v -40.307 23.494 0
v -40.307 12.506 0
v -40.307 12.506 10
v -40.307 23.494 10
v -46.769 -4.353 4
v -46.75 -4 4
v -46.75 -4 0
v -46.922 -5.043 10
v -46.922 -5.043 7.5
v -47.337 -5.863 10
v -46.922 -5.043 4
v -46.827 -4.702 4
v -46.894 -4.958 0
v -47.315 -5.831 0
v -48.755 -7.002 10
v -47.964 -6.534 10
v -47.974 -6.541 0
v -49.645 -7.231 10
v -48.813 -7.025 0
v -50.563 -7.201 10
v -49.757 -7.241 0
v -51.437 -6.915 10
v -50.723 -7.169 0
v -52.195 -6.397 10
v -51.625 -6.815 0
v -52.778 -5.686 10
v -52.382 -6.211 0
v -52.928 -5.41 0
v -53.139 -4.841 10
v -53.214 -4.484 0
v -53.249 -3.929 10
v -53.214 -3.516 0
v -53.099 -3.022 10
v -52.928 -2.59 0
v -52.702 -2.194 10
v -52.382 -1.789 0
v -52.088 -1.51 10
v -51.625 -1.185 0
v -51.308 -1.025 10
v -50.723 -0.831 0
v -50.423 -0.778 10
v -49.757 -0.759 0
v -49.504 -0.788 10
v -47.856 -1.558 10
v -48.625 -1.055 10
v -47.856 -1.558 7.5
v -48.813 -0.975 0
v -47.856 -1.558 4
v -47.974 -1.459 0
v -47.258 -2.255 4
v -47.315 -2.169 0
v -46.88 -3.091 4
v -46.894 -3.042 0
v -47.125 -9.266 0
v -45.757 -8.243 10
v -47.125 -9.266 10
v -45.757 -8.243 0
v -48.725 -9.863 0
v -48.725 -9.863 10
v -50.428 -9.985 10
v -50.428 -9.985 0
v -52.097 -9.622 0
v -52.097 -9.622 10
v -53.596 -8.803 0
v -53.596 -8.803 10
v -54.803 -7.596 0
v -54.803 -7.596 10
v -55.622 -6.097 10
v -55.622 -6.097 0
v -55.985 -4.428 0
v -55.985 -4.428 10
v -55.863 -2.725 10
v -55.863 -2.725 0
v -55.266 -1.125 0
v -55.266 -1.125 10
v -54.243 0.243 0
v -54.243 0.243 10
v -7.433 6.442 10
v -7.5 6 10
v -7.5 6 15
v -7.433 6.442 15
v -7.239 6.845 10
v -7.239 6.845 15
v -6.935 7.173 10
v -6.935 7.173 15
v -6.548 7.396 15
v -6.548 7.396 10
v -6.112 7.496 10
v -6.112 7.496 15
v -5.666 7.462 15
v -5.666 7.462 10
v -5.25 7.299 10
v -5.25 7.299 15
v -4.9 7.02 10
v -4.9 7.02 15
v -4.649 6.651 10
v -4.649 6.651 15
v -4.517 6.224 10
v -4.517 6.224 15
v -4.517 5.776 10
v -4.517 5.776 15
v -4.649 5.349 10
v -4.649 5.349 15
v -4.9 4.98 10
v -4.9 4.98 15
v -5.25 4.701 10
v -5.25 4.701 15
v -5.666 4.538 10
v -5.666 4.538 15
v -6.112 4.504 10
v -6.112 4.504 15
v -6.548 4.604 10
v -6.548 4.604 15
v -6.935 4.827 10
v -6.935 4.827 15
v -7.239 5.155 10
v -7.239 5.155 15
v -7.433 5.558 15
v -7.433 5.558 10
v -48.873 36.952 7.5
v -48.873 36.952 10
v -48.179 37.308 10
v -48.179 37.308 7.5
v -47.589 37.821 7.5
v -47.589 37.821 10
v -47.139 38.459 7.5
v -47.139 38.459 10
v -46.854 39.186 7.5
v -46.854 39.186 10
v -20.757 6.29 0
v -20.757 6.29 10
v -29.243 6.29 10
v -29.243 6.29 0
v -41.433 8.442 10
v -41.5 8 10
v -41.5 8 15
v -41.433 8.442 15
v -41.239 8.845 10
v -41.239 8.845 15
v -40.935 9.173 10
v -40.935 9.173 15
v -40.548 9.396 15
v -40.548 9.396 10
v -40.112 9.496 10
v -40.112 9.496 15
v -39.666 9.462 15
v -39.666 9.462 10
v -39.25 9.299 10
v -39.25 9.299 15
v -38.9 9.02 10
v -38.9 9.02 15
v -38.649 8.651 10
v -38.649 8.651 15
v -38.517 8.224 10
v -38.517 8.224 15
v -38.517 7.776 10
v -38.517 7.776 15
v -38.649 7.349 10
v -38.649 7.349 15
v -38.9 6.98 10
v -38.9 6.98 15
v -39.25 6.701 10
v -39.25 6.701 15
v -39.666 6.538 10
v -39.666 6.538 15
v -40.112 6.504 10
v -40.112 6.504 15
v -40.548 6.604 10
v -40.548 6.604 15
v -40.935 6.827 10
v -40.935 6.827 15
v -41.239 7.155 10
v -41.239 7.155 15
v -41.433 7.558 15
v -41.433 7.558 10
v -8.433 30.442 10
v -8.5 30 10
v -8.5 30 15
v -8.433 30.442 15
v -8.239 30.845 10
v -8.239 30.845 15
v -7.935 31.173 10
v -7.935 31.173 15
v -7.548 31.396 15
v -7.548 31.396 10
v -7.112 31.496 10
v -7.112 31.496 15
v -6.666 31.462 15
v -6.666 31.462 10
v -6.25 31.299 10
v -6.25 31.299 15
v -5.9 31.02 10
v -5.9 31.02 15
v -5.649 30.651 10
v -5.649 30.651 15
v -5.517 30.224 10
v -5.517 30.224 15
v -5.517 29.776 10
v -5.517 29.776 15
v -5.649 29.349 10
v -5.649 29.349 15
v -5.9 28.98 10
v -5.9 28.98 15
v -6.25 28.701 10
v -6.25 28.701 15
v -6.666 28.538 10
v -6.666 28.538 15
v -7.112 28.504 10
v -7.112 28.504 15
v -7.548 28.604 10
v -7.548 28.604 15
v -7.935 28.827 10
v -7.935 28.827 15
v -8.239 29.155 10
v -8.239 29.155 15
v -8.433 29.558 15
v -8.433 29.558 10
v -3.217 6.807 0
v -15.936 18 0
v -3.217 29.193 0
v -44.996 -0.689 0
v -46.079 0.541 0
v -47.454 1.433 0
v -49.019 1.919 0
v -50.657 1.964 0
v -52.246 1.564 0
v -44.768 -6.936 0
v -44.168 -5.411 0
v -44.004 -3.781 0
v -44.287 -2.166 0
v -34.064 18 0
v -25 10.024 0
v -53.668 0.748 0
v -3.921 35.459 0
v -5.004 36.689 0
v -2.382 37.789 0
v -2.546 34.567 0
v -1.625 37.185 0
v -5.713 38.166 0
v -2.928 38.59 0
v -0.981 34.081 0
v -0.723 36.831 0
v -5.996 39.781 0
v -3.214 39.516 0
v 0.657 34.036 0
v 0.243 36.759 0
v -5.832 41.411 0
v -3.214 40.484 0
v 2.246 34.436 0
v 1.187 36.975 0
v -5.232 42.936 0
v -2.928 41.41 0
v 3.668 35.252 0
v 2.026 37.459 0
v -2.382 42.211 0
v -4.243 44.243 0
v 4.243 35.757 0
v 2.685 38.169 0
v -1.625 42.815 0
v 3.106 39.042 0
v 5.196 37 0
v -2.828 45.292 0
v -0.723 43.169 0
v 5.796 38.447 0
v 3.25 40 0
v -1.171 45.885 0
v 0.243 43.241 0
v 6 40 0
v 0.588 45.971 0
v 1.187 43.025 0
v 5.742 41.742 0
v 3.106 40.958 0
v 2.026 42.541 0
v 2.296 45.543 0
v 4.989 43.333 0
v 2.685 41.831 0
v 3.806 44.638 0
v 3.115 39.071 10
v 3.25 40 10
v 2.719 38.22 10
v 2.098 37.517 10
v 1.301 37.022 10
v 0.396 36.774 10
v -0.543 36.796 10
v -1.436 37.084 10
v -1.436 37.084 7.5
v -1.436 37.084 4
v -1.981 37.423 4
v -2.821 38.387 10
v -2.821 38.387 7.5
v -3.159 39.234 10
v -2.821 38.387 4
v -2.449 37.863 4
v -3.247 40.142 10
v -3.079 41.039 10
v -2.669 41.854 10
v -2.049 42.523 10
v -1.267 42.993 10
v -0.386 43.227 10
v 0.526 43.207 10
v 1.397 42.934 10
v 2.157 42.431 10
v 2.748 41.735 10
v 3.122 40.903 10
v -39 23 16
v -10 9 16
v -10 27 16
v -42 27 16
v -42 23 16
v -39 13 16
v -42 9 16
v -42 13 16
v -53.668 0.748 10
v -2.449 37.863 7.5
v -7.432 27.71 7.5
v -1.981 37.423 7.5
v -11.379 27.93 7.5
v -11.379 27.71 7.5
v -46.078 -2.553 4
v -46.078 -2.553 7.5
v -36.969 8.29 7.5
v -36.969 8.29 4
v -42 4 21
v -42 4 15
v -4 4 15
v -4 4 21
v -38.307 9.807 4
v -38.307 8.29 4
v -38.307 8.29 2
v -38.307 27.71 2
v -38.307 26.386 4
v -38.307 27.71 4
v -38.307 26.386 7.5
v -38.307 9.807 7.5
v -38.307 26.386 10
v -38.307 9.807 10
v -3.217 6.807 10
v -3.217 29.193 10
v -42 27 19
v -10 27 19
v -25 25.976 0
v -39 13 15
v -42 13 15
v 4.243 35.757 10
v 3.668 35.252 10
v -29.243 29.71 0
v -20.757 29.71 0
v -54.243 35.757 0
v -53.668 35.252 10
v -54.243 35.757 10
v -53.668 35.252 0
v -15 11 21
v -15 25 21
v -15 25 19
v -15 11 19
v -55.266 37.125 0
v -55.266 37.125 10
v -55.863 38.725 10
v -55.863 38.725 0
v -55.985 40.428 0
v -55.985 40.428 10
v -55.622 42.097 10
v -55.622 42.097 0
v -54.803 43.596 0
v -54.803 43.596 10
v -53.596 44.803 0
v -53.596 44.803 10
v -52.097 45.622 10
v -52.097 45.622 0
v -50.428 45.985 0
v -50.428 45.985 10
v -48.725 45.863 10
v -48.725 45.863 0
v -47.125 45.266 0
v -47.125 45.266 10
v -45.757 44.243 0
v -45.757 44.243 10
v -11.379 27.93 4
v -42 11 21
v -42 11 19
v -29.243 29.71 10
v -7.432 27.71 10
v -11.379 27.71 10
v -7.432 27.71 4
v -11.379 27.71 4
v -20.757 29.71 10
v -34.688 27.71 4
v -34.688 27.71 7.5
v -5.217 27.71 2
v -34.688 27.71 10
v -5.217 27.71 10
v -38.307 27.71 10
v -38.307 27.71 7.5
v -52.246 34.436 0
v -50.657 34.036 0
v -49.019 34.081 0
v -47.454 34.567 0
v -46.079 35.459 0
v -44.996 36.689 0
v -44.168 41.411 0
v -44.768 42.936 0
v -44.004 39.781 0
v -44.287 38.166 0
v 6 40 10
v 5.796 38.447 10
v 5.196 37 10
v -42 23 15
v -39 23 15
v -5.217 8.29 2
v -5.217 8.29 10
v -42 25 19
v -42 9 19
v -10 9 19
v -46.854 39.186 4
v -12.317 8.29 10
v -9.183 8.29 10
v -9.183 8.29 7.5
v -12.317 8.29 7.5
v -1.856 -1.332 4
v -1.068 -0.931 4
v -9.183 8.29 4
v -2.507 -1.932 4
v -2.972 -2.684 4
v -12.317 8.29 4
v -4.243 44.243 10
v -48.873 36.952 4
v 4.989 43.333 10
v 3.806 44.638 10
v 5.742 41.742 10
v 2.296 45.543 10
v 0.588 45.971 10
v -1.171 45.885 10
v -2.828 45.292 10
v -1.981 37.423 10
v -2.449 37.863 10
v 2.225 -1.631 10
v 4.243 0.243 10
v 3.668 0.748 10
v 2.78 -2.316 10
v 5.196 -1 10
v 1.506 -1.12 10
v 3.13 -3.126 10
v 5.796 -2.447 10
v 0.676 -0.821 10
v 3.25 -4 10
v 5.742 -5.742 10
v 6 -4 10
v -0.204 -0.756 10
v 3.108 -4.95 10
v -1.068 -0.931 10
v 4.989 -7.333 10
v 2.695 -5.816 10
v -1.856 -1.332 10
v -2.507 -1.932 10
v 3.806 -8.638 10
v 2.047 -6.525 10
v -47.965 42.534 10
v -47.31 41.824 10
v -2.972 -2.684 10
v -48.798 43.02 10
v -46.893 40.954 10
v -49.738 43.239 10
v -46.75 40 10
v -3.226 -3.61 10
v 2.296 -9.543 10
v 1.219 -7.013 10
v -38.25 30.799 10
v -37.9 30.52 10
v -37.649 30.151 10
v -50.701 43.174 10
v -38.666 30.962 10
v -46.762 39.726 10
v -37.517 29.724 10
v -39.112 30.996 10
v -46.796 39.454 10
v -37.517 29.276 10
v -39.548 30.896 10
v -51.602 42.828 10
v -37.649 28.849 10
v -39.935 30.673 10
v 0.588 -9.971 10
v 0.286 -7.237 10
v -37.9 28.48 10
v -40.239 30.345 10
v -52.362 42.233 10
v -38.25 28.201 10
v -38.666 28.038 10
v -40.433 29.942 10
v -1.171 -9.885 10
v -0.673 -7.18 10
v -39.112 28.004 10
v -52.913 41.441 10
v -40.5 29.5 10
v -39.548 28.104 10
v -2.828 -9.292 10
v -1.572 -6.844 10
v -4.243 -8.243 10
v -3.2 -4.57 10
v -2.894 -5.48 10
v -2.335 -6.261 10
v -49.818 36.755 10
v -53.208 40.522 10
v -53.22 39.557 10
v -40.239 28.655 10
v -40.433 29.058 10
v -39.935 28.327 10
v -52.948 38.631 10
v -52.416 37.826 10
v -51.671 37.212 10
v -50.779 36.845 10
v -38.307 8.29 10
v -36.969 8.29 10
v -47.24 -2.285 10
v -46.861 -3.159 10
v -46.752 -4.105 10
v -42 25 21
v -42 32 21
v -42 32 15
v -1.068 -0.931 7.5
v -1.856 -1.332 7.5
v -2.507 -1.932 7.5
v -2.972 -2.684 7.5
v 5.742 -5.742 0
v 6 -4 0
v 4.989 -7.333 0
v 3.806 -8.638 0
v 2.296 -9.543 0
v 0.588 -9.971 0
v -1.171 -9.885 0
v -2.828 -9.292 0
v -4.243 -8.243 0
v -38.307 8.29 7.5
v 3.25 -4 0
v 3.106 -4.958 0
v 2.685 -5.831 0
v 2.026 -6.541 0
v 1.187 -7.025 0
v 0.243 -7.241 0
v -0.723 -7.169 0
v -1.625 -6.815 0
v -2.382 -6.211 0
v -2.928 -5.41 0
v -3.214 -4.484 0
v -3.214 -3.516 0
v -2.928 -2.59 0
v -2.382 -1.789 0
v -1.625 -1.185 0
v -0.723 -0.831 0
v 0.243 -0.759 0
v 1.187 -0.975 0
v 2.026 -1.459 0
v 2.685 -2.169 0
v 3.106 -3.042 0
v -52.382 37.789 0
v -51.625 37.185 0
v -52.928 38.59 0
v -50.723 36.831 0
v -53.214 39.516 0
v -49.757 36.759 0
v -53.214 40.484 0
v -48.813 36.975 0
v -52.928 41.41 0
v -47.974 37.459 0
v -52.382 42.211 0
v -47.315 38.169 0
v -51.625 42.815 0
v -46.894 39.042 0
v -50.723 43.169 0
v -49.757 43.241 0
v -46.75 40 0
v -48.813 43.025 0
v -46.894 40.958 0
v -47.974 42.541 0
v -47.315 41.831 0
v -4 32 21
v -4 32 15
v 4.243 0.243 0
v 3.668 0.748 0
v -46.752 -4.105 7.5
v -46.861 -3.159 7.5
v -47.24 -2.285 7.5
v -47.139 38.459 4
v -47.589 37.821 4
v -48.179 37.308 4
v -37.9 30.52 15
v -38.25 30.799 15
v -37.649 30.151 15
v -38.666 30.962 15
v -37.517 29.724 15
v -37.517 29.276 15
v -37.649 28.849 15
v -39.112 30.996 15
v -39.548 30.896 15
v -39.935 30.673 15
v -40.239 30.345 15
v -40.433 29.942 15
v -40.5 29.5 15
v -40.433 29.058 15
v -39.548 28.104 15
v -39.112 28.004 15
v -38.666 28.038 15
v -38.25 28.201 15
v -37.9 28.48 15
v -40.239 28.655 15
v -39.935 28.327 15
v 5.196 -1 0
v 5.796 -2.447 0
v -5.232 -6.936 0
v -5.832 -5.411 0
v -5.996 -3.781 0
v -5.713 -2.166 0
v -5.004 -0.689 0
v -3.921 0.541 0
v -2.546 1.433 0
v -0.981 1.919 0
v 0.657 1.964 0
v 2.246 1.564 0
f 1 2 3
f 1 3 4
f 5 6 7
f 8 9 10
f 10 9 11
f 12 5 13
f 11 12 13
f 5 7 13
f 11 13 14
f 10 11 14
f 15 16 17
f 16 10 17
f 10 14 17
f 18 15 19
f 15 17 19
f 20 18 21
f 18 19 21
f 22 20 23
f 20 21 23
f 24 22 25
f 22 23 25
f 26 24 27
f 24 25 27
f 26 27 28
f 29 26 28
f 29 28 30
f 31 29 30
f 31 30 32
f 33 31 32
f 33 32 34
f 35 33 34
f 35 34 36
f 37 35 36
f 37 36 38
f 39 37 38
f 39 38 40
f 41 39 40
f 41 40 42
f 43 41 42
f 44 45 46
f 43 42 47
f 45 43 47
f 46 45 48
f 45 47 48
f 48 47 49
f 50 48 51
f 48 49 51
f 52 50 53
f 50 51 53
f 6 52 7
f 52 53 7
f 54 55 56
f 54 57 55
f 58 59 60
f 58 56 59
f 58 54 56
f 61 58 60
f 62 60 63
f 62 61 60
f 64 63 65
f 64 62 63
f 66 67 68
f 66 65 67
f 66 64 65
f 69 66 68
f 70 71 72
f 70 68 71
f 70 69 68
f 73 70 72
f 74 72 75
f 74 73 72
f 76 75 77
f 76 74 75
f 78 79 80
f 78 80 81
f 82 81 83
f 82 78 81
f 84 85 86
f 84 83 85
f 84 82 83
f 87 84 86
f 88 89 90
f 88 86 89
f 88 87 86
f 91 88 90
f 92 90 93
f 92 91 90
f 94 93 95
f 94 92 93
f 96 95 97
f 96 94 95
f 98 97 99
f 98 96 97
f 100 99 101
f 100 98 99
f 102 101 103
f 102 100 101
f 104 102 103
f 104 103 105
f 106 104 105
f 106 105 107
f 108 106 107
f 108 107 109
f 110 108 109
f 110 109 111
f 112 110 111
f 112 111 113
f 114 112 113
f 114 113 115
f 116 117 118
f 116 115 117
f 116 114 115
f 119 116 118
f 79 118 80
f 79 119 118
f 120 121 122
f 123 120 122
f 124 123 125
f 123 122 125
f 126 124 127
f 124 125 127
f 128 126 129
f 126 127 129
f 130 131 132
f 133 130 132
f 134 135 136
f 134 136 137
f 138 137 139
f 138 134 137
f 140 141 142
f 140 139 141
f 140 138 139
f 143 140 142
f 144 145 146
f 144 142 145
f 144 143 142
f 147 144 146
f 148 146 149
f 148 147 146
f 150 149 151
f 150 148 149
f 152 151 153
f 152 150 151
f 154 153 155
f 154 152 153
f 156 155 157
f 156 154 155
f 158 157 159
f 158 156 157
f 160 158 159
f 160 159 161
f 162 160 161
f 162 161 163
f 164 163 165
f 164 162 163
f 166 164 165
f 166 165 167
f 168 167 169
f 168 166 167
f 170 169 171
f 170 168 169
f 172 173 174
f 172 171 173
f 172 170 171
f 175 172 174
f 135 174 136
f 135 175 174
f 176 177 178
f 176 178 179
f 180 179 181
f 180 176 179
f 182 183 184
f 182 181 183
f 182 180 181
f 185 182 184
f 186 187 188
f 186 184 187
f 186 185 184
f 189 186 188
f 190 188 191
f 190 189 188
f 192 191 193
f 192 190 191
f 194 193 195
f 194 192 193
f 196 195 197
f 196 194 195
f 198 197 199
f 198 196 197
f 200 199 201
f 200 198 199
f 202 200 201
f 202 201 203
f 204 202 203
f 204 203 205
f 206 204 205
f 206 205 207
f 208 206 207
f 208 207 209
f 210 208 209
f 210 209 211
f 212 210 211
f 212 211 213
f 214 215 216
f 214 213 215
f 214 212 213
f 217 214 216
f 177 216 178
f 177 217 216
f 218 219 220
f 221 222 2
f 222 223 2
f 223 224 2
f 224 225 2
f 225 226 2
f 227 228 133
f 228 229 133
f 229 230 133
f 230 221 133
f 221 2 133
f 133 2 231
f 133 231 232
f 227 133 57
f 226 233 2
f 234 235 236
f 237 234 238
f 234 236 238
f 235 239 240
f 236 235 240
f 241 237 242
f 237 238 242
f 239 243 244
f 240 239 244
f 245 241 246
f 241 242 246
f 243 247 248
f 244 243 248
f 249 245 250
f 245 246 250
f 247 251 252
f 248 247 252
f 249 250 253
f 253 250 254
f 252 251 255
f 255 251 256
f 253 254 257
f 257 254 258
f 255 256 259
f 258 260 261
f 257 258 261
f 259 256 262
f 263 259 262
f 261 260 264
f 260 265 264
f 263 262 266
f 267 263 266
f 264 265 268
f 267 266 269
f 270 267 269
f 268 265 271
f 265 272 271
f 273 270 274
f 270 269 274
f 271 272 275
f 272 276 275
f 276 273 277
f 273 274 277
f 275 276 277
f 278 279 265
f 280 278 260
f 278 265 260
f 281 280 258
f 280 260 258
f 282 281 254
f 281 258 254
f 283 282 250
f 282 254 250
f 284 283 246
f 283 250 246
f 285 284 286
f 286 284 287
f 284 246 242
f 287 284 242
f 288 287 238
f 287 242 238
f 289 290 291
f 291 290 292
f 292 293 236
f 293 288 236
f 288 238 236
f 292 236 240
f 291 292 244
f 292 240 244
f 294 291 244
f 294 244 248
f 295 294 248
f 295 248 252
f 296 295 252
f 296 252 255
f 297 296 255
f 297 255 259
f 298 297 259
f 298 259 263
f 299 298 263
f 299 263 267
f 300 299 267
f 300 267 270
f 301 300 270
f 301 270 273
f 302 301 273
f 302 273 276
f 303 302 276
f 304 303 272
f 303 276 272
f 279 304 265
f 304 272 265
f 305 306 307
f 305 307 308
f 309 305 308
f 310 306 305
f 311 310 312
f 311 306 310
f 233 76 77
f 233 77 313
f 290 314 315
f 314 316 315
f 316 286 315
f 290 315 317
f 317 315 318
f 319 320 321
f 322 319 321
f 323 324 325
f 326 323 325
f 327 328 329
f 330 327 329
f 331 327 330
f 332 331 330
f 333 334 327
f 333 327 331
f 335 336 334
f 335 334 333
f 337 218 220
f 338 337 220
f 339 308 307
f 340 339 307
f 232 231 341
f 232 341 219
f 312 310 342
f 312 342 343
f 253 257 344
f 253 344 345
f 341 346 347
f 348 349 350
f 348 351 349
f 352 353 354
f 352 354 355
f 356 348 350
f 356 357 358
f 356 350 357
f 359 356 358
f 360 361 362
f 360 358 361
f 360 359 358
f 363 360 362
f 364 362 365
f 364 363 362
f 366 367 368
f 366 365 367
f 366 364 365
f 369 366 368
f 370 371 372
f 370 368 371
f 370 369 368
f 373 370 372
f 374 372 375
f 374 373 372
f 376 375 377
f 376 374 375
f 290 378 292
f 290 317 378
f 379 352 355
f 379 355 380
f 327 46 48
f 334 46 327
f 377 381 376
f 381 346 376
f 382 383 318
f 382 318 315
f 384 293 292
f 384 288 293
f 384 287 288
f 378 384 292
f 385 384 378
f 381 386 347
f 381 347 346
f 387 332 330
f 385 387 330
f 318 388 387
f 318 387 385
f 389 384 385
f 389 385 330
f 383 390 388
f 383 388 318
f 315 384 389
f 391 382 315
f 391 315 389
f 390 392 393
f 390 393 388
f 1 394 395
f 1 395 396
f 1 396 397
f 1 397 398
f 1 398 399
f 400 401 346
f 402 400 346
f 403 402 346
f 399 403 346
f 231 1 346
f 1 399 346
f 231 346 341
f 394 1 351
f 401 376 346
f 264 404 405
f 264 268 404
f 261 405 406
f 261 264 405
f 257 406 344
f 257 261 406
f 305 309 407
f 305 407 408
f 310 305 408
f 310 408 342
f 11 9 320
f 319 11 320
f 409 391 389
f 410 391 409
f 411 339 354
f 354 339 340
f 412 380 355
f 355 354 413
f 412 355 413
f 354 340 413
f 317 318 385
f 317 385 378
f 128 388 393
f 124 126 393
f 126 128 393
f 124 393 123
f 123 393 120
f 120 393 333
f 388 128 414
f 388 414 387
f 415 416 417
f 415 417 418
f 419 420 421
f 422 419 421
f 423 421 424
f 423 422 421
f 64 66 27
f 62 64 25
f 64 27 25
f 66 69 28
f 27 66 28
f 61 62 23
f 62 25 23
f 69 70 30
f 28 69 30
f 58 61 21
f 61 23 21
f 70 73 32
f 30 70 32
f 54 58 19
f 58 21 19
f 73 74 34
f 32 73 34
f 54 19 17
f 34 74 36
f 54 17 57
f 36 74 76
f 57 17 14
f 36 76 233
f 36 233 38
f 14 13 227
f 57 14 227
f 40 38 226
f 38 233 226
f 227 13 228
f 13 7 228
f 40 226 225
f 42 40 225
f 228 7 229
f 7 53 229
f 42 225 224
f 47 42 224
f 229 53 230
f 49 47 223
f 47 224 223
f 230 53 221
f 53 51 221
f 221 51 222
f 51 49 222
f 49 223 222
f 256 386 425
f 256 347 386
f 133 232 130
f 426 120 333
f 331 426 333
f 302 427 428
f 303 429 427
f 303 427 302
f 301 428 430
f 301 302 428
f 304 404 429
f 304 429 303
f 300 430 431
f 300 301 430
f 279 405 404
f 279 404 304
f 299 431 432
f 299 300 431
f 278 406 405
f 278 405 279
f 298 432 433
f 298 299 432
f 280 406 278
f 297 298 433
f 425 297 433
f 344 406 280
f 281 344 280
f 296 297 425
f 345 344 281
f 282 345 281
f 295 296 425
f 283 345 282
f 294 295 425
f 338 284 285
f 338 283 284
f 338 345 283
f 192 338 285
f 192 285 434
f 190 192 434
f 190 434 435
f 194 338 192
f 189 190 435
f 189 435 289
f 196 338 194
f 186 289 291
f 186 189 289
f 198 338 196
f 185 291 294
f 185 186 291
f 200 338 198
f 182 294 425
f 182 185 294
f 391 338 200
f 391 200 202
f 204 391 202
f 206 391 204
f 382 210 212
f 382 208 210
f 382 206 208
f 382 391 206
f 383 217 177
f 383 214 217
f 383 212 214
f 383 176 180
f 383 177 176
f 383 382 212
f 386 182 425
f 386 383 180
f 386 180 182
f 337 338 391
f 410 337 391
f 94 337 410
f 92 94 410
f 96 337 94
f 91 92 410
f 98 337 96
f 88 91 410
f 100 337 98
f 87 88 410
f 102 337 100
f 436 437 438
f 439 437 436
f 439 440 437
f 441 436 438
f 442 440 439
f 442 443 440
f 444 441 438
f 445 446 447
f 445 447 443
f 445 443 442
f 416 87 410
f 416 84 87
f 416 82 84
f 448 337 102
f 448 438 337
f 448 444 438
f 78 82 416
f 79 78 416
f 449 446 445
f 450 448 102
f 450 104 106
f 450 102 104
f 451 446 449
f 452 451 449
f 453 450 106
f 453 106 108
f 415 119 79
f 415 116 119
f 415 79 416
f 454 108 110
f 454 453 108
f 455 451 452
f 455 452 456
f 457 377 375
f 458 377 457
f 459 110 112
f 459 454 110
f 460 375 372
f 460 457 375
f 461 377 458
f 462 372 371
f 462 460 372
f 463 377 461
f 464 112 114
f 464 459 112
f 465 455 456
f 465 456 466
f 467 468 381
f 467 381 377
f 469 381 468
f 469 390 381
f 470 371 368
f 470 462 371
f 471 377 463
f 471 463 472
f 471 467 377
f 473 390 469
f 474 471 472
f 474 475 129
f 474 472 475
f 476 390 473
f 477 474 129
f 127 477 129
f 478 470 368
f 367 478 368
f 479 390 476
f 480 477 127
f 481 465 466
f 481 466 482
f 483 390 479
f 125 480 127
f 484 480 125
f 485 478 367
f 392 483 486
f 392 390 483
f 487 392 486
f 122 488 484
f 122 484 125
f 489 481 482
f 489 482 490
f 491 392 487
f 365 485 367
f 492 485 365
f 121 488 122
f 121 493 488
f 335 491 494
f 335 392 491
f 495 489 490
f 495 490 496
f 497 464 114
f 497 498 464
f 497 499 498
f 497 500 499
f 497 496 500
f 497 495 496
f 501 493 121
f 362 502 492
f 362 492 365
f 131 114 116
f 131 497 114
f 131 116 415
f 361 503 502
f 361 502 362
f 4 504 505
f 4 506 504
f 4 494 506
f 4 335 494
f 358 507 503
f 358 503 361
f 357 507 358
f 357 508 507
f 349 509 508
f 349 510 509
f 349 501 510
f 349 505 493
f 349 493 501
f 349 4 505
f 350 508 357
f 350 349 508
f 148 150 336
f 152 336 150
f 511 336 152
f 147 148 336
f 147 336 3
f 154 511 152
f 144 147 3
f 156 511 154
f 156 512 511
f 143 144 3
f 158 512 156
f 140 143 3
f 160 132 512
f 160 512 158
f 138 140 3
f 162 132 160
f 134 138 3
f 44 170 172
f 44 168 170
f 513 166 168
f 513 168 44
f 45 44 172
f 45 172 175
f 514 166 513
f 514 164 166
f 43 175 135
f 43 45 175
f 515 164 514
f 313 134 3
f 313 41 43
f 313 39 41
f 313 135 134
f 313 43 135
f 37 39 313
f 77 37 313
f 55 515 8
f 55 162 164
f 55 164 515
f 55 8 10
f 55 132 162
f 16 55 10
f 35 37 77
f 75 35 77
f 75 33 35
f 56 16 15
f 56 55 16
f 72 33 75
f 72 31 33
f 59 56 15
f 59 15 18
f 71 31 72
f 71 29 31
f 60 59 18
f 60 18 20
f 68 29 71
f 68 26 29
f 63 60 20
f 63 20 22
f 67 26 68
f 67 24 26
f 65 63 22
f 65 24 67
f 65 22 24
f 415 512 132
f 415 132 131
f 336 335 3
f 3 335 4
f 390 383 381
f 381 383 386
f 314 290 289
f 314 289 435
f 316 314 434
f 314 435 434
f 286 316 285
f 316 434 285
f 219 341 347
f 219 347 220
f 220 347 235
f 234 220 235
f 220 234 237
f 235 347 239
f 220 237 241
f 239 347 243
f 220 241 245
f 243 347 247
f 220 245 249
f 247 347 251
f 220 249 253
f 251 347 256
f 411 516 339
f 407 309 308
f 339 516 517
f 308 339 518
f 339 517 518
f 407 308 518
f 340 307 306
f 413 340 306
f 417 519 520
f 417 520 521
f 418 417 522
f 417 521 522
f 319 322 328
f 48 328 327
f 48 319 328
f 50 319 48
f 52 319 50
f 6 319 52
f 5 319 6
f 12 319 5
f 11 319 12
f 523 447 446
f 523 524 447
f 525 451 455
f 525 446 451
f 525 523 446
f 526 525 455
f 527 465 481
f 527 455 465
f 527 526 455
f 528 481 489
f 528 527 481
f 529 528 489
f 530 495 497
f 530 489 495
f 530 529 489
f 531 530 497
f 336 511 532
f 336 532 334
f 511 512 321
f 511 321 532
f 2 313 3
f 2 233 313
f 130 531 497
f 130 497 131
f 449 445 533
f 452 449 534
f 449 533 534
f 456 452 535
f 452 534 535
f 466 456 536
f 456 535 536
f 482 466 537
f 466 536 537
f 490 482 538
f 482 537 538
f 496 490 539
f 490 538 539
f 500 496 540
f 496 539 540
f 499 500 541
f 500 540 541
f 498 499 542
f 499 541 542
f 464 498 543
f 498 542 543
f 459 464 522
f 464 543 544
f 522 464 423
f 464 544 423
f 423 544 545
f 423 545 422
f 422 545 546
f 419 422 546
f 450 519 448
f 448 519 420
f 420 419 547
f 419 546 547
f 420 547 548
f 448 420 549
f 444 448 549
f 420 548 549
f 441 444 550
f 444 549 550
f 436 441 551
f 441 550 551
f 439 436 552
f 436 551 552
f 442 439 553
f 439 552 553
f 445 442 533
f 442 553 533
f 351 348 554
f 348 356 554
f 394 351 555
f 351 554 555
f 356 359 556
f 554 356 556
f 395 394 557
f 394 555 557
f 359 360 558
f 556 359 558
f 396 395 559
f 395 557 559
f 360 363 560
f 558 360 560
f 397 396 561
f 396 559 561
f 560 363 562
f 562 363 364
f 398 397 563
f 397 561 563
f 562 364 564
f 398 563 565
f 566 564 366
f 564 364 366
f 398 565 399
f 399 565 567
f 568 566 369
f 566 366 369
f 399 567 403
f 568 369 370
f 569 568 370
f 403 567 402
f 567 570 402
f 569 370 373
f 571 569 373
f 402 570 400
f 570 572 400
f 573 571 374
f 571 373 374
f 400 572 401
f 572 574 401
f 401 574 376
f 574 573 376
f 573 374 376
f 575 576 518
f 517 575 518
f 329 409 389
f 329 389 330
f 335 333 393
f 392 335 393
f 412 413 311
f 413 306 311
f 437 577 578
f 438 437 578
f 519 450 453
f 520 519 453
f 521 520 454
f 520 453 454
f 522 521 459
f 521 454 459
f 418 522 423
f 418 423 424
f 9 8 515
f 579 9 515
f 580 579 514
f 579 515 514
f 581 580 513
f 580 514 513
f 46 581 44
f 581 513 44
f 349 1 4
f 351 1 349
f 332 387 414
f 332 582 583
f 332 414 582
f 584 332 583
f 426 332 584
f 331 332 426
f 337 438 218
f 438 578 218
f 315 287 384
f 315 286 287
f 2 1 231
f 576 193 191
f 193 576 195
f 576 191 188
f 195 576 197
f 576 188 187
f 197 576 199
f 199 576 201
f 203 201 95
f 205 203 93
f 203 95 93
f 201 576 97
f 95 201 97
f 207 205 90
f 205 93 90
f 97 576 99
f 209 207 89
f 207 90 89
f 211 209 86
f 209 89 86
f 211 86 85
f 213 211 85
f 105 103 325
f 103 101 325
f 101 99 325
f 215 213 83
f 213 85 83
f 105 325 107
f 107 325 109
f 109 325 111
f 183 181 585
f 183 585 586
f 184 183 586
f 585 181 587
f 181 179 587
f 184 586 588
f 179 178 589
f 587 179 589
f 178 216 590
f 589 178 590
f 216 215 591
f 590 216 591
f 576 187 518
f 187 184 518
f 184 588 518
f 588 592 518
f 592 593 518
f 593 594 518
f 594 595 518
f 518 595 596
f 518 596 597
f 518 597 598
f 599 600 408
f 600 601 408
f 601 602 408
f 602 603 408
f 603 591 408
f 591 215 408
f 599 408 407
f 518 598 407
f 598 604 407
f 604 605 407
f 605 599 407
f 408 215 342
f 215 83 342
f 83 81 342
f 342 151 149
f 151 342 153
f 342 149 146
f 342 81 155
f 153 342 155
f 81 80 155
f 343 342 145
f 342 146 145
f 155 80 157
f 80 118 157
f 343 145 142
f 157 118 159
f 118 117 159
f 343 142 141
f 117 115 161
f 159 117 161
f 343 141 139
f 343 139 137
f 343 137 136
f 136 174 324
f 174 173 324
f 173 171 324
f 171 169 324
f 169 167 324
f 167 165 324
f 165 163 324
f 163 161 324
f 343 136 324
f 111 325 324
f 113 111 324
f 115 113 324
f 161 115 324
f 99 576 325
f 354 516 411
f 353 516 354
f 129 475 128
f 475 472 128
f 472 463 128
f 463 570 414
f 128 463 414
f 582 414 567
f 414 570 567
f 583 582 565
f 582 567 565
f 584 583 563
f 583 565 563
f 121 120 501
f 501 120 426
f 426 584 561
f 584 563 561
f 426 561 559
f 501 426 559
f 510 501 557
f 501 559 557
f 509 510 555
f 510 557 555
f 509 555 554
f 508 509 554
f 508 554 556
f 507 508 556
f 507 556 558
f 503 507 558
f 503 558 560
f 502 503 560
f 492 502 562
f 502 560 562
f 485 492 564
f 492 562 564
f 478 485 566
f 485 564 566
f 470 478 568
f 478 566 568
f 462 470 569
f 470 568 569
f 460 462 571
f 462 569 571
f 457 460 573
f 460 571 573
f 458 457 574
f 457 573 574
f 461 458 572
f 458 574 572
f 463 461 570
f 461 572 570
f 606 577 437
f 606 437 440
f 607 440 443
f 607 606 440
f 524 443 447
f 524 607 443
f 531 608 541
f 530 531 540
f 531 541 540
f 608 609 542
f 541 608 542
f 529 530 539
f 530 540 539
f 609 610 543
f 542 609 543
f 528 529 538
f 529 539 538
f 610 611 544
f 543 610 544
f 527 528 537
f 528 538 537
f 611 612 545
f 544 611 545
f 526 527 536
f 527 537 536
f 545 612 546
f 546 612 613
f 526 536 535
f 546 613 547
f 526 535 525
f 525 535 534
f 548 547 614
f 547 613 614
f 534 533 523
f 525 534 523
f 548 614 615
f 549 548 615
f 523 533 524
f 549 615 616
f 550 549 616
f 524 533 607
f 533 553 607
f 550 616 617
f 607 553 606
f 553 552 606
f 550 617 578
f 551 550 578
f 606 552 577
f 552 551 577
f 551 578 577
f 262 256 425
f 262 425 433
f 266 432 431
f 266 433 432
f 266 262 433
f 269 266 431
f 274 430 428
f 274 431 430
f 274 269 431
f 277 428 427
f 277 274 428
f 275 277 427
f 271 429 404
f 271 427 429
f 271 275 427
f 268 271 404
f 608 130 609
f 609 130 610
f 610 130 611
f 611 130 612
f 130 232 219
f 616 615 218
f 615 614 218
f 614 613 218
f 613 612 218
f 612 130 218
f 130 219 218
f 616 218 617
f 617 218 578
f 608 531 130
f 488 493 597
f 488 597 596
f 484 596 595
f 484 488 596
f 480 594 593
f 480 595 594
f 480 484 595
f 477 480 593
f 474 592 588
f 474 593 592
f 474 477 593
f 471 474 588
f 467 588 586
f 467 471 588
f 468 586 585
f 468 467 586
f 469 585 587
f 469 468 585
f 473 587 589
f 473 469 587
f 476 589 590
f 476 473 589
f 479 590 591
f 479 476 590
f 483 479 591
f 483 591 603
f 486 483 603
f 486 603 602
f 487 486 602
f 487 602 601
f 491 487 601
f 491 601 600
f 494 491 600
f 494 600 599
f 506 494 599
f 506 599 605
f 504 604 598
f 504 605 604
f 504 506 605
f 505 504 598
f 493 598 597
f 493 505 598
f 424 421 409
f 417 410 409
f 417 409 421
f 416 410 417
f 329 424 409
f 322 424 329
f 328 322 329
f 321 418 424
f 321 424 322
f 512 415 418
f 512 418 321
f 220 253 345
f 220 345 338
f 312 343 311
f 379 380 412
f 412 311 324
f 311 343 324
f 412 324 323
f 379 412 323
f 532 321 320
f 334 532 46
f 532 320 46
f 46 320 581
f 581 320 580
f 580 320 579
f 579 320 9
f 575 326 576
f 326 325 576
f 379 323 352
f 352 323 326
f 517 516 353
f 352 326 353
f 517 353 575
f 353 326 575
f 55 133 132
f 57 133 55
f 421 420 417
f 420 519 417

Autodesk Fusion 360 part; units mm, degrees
sketch "Skizze1" plane through (0, 0, 0) normal (0, 0, 1) x (1, 0, 0)
  line L0 (-50, 40) -> (0, 40) construction
  circle A0 centre (-50, 40) radius 3.25
  circle A1 centre (0, 40) radius 3.25
  line L1 (-25, 40) -> (-25, -4) construction
  line L2 (-25, -4) -> (0, -4) construction
  line L3 (0, -4) -> (-50, -4) construction
  circle A2 centre (-50, -4) radius 3.25
  circle A3 centre (0, -4) radius 3.25
  circle A4 centre (-50, 40) radius 6
  circle A5 centre (0, 40) radius 6
  circle A6 centre (0, -4) radius 6
  circle A7 centre (-50, -4) radius 6
  line L4 (-50, -4) -> (0, 40) construction
  line L5 (0, -4) -> (-50, 40) construction
  line L6 (-50, 40) -> (-50, 46) construction
  line L7 (-50, 40) -> (-49.8093, 40.2167) construction
  line L8 (-50, 40) -> (-45.7574, 44.2426) construction
  line L9 (-50, 40) -> (-44, 40) construction
  line L10 (-50, 40) -> (-56, 40) construction
  line L11 (-50, 40) -> (-54.2426, 35.7574) construction
  line L12 (0, -4) -> (6, -4) construction
  line L13 (0, -4) -> (4.2426, 0.2426) construction
  line L14 (0, -4) -> (6, -4) construction
  line L15 (0, -4) -> (0, -10) construction
  line L16 (0, -4) -> (-4.2426, -8.2426) construction
  line L17 (-4.2426, -8.2426) -> (-54.2426, 35.7574)
  line L18 (4.2426, 0.2426) -> (-45.7574, 44.2426)
  line L19 (0, 40) -> (0, 46) construction
  line L20 (0, 40) -> (-4.2426, 44.2426) construction
  line L21 (0, 40) -> (4.2426, 35.7574) construction
  line L22 (0, 40) -> (6, 40) construction
  line L23 (-50, -4) -> (-45.7574, -8.2426) construction
  line L24 (-50, -4) -> (-44, -4) construction
  line L25 (-50, -4) -> (-54.2426, 0.2426) construction
  line L26 (-50, -4) -> (-44, -4) construction
  line L27 (-54.2426, 0.2426) -> (-4.2426, 44.2426)
  line L28 (4.2426, 35.7574) -> (-45.7574, -8.2426)
  line L29 (-3.2166, 6.8068) -> (-3.2166, 29.1932)
  line L30 (-40.3073, 12.5057) -> (-40.3073, 23.4943)
  line L31 (-20.7574, 6.2903) -> (-29.2426, 6.2903)
  line L32 (-20.7574, 29.7097) -> (-29.2426, 29.7097)
  dimension "d2" = 6.5
  dimension "d3" = 6.5
  dimension "d4" = 6.5
  dimension "d5" = 6.5
  dimension "d6" = 12
  dimension "d7" = 12
  dimension "d8" = 12
  dimension "d9" = 45
  dimension "d10" = 135
  dimension "d11" = 6
  dimension "d12" = 45
  dimension "d13" = 135
  dimension "d14" = 135
  dimension "d15" = 45
  dimension "d16" = 6
  dimension "d17" = 45
  dimension "d18" = 135
extrude "Extrusion1" add sketch "Skizze1" along normal blind 10 contours A4 L17 | A4 L17 L18 L27 | A5 L18 L27 L28 | L17 L18 L27 L28 | A7 L17 L27 L28 | A6 L17 L18 L28 | A5 L28 | A7 L27 | A6 L18 picked at (-55.035, 39.3919) picked at (-3.2811, 43.8676) picked at (-46.7227, -7.8704) picked at (-3.2811, -7.8676)
extrude "Extrusion2" add sketch "Skizze1" along normal blind 10 contours L18 L27 L32 | L17 L27 L30 | L18 L28 L29 | L17 L28 L31
sketch "Skizze2" plane through (0, 0, 10) normal (0, 0, 1) x (-1, 0, 0)
  circle A0 centre (0, -40) radius 3.25
  circle A1 centre (50, 4) radius 3.25
  circle A2 centre (50, -40) radius 3.25
  circle A3 centre (0, 4) radius 3.25
  line L0 (29.2426, -29.7097) -> (45.7574, -44.2426)
  arc A4 (45.7574, -44.2426) -> (54.2426, -35.7574) centre (50, -40) ccw
  line L1 (54.2426, -35.7574) -> (40.3073, -23.4943)
  line L2 (40.3073, -23.4943) -> (40.3073, -12.5057)
  line L3 (40.3073, -12.5057) -> (54.2426, -0.2426)
  arc A5 (54.2426, -0.2426) -> (45.7574, 8.2426) centre (50, 4) ccw
  line L4 (45.7574, 8.2426) -> (29.2426, -6.2903)
  line L5 (29.2426, -6.2903) -> (20.7574, -6.2903)
  line L6 (20.7574, -6.2903) -> (4.2426, 8.2426)
  arc A6 (4.2426, 8.2426) -> (-4.2426, -0.2426) centre (0, 4) ccw
  line L7 (-4.2426, -0.2426) -> (3.2166, -6.8068)
  line L8 (3.2166, -6.8068) -> (3.2166, -29.1932)
  line L9 (3.2166, -29.1932) -> (-4.2426, -35.7574)
  arc A7 (-4.2426, -35.7574) -> (4.2426, -44.2426) centre (0, -40) ccw
  line L10 (4.2426, -44.2426) -> (20.7574, -29.7097)
  line L11 (20.7574, -29.7097) -> (29.2426, -29.7097)
  line L12 (5.2166, -8.2903) -> (38.3073, -8.2903) construction
  line L13 (38.3073, -8.2903) -> (38.3073, -27.7097) construction
  line L14 (38.3073, -27.7097) -> (5.2166, -27.7097) construction
  line L15 (5.2166, -27.7097) -> (5.2166, -8.2903) construction
  line L16 (3.2166, -6.8068) -> (3.2166, -29.1932) construction
  line L17 (5.2166, -8.2903) -> (38.3073, -8.2903)
  line L18 (38.3073, -8.2903) -> (38.3073, -27.7097)
  line L19 (38.3073, -27.7097) -> (5.2166, -27.7097)
  line L20 (5.2166, -27.7097) -> (5.2166, -8.2903)
  dimension "d24" = 2
  dimension "d25" = 2
  dimension "d26" = 2
  dimension "d27" = 2
extrude "Extrusion3" cut sketch "Skizze2" against normal blind 8 contours L17 L18 L19 L20
sketch "Skizze3" plane through (0, 0, 10) normal (0, 0, 1) x (-1, 0, 0)
  line L0 (38.3073, -8.2903) -> (38.3073, -27.7097)
  line L1 (38.3073, -27.7097) -> (5.2166, -27.7097)
  line L2 (5.2166, -27.7097) -> (5.2166, -8.2903)
  line L3 (5.2166, -8.2903) -> (38.3073, -8.2903)
  circle A0 centre (0, -40) radius 3.25
  circle A1 centre (50, 4) radius 3.25
  circle A2 centre (50, -40) radius 3.25
  circle A3 centre (0, 4) radius 3.25
  line L4 (29.2426, -29.7097) -> (45.7574, -44.2426)
  arc A4 (45.7574, -44.2426) -> (54.2426, -35.7574) centre (50, -40) ccw
  line L5 (54.2426, -35.7574) -> (40.3073, -23.4943)
  line L6 (40.3073, -23.4943) -> (40.3073, -12.5057)
  line L7 (40.3073, -12.5057) -> (54.2426, -0.2426)
  arc A5 (54.2426, -0.2426) -> (45.7574, 8.2426) centre (50, 4) ccw
  line L8 (45.7574, 8.2426) -> (29.2426, -6.2903)
  line L9 (29.2426, -6.2903) -> (20.7574, -6.2903)
  line L10 (20.7574, -6.2903) -> (4.2426, 8.2426)
  arc A6 (4.2426, 8.2426) -> (-4.2426, -0.2426) centre (0, 4) ccw
  line L11 (-4.2426, -0.2426) -> (3.2166, -6.8068)
  line L12 (3.2166, -6.8068) -> (3.2166, -29.1932)
  line L13 (3.2166, -29.1932) -> (-4.2426, -35.7574)
  arc A7 (-4.2426, -35.7574) -> (4.2426, -44.2426) centre (0, -40) ccw
  line L14 (4.2426, -44.2426) -> (20.7574, -29.7097)
  line L15 (20.7574, -29.7097) -> (29.2426, -29.7097)
  line L16 (48.8732, -36.9516) -> (38.0802, -26.1585)
  line L17 (48.8732, -36.9516) -> (64.1369, -36.9516) construction
  line L18 (46.8537, -39.1856) -> (34.6878, -27.7097)
  line L19 (48.8732, -36.9516) -> (46.8537, -39.1856)
  line L20 (38.0802, -26.1585) -> (34.6878, -27.7097)
  line L21 (1.4355, -37.0842) -> (7.4315, -27.7097)
  line L22 (11.379, -27.7097) -> (11.379, -27.9297)
  line L23 (11.379, -27.9297) -> (2.8213, -38.3867)
  line L24 (11.379, -27.7097) -> (7.4315, -27.7097)
  line L25 (2.8213, -38.3867) -> (1.4355, -37.0842)
  line L26 (1.0685, 0.9307) -> (9.1829, -8.2903)
  line L27 (2.9716, 2.684) -> (12.3168, -8.2903)
  line L28 (47.853, 1.5602) -> (47.9543, 1.6753)
  line L29 (47.9543, 1.6753) -> (38.3073, -9.8074)
  line L30 (46.9218, 5.0426) -> (46.0785, 2.5527)
  line L31 (46.0785, 2.5527) -> (36.9689, -8.2903)
  line L32 (38.3073, -9.8074) -> (36.9689, -8.2903)
  line L33 (46.9218, 5.0426) -> (46.9218, 4.5082)
  line L34 (46.9218, 4.5082) -> (47.853, 1.5602)
  line L35 (2.9716, 2.684) -> (1.0685, 0.9307)
  line L36 (12.3168, -8.2903) -> (9.1829, -8.2903)
  line L37 (9.1829, -8.2903) -> (12.3168, -8.2903)
  dimension "d30" = 135
extrude "Extrusion4" cut sketch "Skizze3" against normal blind 6 contours L0 L3 A1 L29 L30 L31 | L0 L1 A2 L16 L18 | L3 A3 L26 L27 L36 L37 | L1 A0 L21 L22 L23 L24
extrude "Extrusion5" add sketch "Skizze3" against normal blind 2.5 contours L0 L3 A1 L29 L30 L31 | L0 L1 A2 L16 L18 | L3 A3 L26 L27 L36 L37 | L1 A0 L21 L22 L23 L24
sketch "Skizze4" plane through (0, 0, 10) normal (0, 0, 1) x (-1, 0, 0)
  circle A0 centre (39, -29.5) radius 1.5
  circle A1 centre (7, -30) radius 1.5
  circle A2 centre (40, -8) radius 1.5
  circle A3 centre (6, -6) radius 1.5
  dimension "d35" = 3
  dimension "d36" = 3
  dimension "d37" = 3
  dimension "d38" = 3
extrude "Extrusion6" add sketch "Skizze4" along normal blind 5
sketch "Skizze5" plane through (0, 0, 15) normal (0, 0, 1) x (-1, 0, 0)
  circle A0 centre (40, -8) radius 1.5
  line L0 (4, -4) -> (42, -4)
  line L1 (42, -4) -> (42, -32)
  line L2 (42, -32) -> (4, -32)
  line L3 (4, -32) -> (4, -4)
extrude "Extrusion7" add sketch "Skizze5" along normal blind 1 contours A0 | L0 L1 L2 L3
sketch "Skizze6" plane through (0, 0, 16) normal (0, 0, 1) x (-1, 0, 0)
  line L0 (4, -32) -> (42, -32)
  line L1 (42, -32) -> (42, -4)
  line L2 (42, -4) -> (4, -4)
  line L3 (4, -4) -> (4, -32)
  line L4 (42, -27) -> (10, -27)
  line L5 (10, -27) -> (10, -9)
  line L6 (10, -9) -> (42, -9)
  line L7 (42, -9) -> (42, -4)
  line L8 (4, -4) -> (4, -32)
  line L9 (42, -32) -> (42, -27)
  dimension "d43" = 5
  dimension "d44" = 5
  dimension "d45" = 6
extrude "Extrusion8" add sketch "Skizze6" along normal blind 5 contours L0 L1 L2 L3 L4 L5 L6 L7 L8 L9
sketch "Skizze7" plane through (0, 0, 16) normal (0, 0, 1) x (-1, 0, 0)
  line L0 (42, -9) -> (10, -9)
  line L1 (10, -9) -> (10, -27)
  line L2 (10, -27) -> (42, -27)
  line L3 (42, -27) -> (42, -9)
  line L4 (42, -23) -> (39, -23)
  line L5 (39, -23) -> (39, -13)
  line L6 (39, -13) -> (42, -13)
  line L7 (42, -23) -> (42, -13)
extrude "Extrusion9" cut sketch "Skizze7" against normal blind 1 contours L3 L4 L5 L6 L7
sketch "Skizze8" plane through (0, 27, 0) normal (0, -1, 0) x (1, 0, 0)
  line L0 (-42, 16) -> (-10, 16)
  line L1 (-10, 16) -> (-10, 21)
  line L2 (-10, 21) -> (-42, 21)
  line L3 (-42, 21) -> (-42, 16)
  line L4 (-42, 19) -> (-10, 19)
extrude "Extrusion10" add sketch "Skizze8" along normal blind 2 contours L1 L2 L3 L4
sketch "Skizze9" plane through (0, 9, 0) normal (0, 1, 0) x (-1, 0, 0)
  line L0 (10, 16) -> (42, 16)
  line L1 (42, 16) -> (42, 21)
  line L2 (42, 21) -> (10, 21)
  line L3 (10, 21) -> (10, 16)
  line L4 (10, 19) -> (42, 19)
extrude "Extrusion11" add sketch "Skizze9" along normal blind 2 contours L1 L2 L3 L4
sketch "Skizze10" plane through (-10, 0, 0) normal (-1, 0, 0) x (0, -1, 0)
  line L0 (-11, 19) -> (-11, 21)
  line L1 (-11, 21) -> (-25, 21)
  line L2 (-25, 21) -> (-25, 19)
  line L3 (-25, 19) -> (-27, 19)
  line L4 (-27, 19) -> (-27, 16)
  line L5 (-27, 16) -> (-9, 16)
  line L6 (-9, 16) -> (-9, 19)
  line L7 (-9, 19) -> (-11, 19)
  line L8 (-25, 19) -> (-11, 19)
extrude "Extrusion12" add sketch "Skizze10" along normal blind 5 contours L0 L1 L2 L8
